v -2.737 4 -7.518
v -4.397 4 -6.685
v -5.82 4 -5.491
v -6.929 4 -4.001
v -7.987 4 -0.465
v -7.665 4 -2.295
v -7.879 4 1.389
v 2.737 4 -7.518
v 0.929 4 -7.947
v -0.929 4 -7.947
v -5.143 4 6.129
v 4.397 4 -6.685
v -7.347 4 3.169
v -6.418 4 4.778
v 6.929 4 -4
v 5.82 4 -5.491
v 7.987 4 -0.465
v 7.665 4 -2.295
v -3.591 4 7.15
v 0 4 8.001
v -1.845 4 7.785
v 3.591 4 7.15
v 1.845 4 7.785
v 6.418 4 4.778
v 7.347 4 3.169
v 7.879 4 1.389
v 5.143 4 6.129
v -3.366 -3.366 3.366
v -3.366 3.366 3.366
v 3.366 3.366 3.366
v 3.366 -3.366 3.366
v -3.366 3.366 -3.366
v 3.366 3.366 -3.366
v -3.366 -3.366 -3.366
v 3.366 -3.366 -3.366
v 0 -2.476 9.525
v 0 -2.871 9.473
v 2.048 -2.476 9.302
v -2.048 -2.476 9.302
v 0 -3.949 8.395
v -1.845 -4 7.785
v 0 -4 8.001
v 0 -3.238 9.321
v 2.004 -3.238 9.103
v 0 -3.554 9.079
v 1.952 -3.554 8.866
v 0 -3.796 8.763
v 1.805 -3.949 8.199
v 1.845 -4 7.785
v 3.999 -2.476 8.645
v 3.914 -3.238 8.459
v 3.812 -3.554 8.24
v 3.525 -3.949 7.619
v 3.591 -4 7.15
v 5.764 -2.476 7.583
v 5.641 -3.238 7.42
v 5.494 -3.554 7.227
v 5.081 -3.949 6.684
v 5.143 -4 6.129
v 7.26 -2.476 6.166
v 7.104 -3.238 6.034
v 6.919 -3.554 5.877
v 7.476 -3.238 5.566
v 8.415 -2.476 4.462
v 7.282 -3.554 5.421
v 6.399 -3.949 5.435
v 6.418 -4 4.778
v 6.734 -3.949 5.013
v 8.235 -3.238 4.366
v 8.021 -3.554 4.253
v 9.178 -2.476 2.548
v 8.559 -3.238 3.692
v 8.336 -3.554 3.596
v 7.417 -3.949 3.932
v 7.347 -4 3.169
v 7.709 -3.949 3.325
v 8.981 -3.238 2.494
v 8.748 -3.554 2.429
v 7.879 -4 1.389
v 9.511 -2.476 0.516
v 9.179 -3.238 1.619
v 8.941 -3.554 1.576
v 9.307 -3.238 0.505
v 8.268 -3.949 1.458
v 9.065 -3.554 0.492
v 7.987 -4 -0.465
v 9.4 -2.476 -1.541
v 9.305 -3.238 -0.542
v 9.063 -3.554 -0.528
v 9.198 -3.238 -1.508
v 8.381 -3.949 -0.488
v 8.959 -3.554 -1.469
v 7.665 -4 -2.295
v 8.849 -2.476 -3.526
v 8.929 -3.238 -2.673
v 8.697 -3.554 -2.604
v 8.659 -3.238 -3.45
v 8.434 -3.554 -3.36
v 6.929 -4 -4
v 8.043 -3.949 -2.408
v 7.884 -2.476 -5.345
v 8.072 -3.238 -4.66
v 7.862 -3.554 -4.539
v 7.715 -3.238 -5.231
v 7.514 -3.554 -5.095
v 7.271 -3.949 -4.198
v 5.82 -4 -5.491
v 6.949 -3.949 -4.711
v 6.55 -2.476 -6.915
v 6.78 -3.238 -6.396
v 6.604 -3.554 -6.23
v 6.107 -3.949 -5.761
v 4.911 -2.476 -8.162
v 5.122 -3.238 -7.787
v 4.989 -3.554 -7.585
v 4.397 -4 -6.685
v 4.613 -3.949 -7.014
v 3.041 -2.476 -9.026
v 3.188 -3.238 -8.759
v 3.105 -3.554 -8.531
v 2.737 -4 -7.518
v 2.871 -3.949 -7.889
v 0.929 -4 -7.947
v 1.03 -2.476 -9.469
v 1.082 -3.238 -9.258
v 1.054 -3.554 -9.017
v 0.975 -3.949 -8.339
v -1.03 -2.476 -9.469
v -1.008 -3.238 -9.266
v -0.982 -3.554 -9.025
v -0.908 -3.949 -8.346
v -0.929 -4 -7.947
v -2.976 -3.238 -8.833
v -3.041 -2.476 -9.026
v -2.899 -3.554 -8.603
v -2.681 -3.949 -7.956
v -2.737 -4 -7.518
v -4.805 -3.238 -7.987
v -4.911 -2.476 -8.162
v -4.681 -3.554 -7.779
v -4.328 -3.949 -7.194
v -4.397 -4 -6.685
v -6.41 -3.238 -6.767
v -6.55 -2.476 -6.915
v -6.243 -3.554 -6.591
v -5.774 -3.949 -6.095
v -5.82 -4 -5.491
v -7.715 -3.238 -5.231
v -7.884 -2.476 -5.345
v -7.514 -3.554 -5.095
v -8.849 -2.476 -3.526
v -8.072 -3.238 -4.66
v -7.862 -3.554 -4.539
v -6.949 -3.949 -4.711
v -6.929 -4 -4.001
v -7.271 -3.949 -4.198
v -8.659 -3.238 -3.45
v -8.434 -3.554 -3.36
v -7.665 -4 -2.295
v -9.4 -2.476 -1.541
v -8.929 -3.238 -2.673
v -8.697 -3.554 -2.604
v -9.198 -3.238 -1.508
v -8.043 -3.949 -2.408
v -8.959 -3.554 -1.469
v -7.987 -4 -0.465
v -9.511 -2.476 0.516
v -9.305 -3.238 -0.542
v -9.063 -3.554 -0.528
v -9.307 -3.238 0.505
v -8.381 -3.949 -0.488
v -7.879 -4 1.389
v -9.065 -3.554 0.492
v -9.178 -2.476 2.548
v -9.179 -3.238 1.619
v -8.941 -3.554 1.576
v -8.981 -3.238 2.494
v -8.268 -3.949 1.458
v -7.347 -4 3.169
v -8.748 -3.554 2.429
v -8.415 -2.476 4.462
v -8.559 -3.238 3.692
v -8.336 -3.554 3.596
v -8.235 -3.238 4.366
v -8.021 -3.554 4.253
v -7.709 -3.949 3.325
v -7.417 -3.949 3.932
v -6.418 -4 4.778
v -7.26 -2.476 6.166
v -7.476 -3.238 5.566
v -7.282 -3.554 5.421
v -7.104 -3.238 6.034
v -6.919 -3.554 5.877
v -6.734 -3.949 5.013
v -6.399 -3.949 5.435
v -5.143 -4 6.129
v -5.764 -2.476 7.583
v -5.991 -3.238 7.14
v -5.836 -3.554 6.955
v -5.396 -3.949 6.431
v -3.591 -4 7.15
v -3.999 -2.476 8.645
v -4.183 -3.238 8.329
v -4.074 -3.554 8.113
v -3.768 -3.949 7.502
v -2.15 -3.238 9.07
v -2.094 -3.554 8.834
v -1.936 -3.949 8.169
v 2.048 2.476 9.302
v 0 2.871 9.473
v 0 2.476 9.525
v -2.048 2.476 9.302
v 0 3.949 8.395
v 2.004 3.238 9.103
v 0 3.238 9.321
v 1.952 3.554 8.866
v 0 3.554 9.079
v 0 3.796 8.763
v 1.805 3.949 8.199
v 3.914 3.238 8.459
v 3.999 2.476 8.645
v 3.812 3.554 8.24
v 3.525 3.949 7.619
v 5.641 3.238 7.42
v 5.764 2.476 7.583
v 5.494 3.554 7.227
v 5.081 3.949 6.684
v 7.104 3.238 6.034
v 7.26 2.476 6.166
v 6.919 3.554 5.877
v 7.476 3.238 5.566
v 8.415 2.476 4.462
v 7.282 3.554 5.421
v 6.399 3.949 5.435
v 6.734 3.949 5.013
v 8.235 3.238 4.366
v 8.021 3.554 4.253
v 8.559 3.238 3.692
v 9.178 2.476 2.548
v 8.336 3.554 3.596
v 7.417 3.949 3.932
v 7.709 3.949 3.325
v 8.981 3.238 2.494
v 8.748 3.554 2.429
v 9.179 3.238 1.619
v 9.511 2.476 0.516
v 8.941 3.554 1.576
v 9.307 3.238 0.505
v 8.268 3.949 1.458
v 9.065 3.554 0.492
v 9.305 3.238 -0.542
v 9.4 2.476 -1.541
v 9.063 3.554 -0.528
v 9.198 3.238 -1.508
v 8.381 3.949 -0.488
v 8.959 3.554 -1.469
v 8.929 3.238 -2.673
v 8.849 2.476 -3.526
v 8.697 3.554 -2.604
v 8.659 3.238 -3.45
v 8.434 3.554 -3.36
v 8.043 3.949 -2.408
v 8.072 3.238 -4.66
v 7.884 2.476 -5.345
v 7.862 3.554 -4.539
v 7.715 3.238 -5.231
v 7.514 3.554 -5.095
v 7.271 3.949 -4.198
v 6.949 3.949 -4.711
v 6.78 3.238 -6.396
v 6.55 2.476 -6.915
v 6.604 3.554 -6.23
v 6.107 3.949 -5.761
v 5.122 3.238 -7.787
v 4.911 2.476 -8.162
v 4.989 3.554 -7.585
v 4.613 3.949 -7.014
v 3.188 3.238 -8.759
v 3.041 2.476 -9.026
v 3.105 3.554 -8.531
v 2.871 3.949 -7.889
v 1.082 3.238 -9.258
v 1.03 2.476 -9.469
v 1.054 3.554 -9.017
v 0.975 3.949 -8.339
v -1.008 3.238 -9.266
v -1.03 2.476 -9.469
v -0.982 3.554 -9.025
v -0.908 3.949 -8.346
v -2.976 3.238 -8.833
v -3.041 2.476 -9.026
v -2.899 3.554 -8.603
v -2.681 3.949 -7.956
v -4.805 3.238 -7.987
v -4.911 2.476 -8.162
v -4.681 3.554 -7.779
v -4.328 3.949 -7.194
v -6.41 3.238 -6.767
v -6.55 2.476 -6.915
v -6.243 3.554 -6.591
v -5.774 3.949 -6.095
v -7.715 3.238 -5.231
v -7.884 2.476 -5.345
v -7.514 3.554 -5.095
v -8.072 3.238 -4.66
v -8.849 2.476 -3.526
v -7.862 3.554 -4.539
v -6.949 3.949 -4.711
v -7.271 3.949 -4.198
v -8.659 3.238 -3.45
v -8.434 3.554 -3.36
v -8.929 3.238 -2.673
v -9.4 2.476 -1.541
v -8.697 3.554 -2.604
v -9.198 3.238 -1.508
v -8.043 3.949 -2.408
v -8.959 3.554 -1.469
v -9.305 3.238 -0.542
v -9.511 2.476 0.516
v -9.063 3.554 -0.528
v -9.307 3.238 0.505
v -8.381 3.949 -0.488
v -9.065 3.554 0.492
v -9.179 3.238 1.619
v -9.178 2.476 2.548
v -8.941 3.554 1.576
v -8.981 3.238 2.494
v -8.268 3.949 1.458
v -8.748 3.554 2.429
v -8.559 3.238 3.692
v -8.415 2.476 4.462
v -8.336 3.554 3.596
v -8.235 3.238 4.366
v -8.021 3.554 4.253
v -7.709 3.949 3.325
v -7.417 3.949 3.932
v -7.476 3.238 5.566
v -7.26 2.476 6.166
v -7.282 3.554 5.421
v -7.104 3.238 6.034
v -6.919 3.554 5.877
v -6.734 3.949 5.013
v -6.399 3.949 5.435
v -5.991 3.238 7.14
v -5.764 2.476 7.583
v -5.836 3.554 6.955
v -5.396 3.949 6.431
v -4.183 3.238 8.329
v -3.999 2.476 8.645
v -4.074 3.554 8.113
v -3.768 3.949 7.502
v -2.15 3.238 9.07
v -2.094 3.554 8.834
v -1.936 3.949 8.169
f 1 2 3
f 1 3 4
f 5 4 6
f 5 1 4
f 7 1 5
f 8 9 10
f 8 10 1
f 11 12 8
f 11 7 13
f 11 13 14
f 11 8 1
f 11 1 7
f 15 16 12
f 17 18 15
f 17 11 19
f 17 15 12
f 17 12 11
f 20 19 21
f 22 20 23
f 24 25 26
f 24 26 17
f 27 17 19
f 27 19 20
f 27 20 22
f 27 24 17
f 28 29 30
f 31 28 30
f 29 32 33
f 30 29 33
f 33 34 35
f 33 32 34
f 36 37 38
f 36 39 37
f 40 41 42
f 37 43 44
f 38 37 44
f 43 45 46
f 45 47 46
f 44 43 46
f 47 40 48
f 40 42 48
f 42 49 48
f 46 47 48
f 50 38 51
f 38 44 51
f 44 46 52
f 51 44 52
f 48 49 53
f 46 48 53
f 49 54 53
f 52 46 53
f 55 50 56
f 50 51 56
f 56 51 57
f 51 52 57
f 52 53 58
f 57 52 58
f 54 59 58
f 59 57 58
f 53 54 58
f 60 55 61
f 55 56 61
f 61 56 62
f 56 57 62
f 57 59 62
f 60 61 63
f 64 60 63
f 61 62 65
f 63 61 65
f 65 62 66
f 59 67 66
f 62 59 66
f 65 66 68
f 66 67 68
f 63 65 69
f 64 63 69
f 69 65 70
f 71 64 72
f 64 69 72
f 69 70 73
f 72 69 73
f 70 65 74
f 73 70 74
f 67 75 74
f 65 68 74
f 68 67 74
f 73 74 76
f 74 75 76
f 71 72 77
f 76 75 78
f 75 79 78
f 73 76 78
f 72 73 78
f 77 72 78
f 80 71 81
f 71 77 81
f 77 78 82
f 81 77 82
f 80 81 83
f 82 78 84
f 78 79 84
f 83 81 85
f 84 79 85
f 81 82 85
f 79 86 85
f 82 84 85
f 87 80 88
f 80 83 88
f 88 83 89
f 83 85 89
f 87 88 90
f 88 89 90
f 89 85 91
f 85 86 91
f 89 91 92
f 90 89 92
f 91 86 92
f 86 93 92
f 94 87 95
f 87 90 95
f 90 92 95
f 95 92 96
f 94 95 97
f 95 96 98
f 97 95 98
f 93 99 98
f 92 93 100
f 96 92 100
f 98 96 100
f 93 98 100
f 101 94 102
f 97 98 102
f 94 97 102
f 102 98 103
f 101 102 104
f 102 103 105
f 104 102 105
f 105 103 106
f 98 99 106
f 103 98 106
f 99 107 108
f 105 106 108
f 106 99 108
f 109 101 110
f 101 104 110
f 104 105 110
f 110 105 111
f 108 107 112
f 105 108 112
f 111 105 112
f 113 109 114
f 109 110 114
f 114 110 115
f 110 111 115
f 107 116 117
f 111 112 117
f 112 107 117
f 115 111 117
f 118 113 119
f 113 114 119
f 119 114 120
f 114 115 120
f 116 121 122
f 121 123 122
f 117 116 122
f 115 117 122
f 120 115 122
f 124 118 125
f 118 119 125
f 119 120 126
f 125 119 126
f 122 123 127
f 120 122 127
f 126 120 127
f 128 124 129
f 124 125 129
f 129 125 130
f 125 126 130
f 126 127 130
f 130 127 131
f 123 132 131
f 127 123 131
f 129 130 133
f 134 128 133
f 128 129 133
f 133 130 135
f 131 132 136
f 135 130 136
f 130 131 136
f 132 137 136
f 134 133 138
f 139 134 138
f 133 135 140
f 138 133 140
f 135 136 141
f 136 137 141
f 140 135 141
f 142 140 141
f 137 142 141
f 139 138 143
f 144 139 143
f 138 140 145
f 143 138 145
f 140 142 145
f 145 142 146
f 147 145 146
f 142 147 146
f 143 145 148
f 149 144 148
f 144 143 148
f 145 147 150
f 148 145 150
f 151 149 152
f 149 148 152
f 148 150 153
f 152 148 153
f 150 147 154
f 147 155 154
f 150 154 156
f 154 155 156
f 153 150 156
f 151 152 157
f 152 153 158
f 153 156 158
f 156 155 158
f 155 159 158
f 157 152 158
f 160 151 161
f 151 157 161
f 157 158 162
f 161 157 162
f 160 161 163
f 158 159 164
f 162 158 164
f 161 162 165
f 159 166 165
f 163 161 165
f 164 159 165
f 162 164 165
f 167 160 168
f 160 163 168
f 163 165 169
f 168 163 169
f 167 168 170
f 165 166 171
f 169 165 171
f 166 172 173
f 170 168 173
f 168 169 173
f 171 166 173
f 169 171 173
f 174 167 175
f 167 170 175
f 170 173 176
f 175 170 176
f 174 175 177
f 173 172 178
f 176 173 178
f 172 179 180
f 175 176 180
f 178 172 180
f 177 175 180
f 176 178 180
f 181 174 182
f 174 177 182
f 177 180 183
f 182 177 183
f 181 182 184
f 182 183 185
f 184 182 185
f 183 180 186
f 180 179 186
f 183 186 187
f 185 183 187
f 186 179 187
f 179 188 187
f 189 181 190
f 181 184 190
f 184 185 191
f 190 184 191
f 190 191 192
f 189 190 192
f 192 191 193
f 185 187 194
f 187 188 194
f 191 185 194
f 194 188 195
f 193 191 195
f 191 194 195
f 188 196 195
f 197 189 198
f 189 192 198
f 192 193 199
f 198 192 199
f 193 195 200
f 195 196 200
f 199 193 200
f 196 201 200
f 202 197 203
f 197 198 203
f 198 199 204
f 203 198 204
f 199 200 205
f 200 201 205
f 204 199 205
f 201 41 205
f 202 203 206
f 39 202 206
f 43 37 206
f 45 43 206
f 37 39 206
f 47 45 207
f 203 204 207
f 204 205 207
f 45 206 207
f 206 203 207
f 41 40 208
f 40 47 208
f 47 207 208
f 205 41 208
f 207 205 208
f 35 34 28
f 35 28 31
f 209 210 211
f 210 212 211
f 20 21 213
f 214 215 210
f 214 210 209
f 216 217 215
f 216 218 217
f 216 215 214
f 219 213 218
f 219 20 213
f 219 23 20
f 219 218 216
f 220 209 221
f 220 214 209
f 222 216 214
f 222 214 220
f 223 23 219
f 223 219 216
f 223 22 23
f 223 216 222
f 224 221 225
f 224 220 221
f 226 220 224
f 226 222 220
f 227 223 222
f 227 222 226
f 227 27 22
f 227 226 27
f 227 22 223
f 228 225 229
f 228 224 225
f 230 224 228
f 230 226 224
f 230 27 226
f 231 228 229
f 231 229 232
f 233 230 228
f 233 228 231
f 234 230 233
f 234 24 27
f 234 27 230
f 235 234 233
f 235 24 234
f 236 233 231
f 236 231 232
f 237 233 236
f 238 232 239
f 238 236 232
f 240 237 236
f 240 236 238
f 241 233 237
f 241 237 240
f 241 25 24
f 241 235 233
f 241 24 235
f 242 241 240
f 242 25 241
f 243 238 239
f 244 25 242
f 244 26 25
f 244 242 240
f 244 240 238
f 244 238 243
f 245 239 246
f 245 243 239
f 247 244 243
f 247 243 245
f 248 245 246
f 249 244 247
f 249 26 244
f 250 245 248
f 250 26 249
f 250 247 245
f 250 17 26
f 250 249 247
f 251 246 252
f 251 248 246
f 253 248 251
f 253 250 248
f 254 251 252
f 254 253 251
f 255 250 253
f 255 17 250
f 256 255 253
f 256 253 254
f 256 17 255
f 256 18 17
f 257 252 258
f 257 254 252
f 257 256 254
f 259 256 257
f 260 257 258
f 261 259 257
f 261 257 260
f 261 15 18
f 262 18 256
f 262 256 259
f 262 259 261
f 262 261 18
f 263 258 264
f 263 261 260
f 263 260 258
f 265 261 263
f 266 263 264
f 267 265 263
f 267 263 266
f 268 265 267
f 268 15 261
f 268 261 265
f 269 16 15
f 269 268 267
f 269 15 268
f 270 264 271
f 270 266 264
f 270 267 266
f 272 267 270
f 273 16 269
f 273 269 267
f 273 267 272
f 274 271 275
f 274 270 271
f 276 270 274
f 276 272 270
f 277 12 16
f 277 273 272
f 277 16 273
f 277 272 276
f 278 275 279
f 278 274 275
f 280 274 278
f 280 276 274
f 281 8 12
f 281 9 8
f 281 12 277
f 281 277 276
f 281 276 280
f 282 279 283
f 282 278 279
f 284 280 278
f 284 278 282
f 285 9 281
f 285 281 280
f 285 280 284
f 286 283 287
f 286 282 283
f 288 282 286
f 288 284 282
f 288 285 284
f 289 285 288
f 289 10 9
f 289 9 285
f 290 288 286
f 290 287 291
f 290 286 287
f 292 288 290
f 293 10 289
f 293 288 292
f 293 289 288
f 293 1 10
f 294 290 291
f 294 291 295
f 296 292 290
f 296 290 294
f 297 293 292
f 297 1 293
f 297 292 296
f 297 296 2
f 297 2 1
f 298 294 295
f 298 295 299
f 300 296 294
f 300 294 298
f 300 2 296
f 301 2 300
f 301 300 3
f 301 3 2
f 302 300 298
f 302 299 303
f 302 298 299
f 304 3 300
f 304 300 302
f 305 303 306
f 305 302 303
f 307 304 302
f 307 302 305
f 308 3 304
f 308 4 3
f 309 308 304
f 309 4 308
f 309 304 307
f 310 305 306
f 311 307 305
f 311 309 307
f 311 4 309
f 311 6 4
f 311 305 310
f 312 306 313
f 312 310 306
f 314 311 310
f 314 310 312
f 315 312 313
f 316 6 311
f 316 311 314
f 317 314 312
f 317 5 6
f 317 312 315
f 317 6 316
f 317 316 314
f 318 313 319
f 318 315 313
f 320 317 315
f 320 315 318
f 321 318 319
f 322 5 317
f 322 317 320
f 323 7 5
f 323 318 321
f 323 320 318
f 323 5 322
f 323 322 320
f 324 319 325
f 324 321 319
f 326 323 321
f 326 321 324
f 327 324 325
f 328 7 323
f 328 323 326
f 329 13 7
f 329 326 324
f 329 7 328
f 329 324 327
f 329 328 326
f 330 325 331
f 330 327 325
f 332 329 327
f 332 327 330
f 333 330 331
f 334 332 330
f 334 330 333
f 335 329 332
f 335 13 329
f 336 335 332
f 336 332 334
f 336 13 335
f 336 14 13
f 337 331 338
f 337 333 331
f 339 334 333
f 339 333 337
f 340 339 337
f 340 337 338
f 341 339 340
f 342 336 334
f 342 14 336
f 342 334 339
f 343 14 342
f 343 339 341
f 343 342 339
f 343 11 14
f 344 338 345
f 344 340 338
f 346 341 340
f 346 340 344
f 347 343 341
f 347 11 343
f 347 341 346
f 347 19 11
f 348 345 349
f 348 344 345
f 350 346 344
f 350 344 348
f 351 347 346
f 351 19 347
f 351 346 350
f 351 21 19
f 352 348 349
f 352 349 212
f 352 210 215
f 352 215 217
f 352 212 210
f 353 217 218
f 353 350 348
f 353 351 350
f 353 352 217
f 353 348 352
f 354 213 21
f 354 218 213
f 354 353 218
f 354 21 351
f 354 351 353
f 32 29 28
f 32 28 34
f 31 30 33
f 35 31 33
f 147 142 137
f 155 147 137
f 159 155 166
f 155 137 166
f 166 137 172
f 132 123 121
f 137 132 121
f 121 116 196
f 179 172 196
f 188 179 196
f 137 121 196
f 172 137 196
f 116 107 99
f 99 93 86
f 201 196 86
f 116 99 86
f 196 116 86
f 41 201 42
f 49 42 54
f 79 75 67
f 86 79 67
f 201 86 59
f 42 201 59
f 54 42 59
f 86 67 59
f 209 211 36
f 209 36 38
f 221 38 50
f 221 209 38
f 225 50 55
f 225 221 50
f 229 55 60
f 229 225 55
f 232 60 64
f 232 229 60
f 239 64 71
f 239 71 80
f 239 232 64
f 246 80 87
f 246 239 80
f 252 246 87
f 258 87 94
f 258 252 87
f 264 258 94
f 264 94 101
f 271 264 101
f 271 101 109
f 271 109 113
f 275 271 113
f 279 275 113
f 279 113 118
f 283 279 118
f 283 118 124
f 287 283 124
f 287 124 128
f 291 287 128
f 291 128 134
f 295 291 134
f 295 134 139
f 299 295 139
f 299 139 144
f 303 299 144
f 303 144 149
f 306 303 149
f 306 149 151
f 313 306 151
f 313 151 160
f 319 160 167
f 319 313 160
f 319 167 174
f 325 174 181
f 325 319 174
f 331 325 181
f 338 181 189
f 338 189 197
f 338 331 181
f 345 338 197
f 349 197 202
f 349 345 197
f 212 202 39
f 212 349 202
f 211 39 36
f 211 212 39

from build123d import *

# Parameters (mm, degrees)
SKETCH1_R           = 9.525
BOSS_EXTRUDE1_DEPTH = 4.0005
SKETCH1_3_W         = 6.731
SKETCH1_3_H         = 6.731
CUT_EXTRUDE1_DEPTH  = 3.3655
FILLET1_R           = 1.524


with BuildPart() as part:
    # Sketch1 → Boss-Extrude1 (new, symmetric)
    with BuildSketch(Plane(origin=(0, 0, 0), x_dir=(1, 0, 0), z_dir=(0, 1, 0))):
        Circle(SKETCH1_R)
    extrude(amount=BOSS_EXTRUDE1_DEPTH, both=True)

    # Sketch1<3> → Cut-Extrude1 (cut, symmetric)
    with BuildSketch(Plane(origin=(0, 0, 0), x_dir=(1, 0, 0), z_dir=(0, 1, 0))):
        Rectangle(SKETCH1_3_W, SKETCH1_3_H)
    extrude(amount=CUT_EXTRUDE1_DEPTH, both=True, mode=Mode.SUBTRACT)

    # Fillet1
    fillet1_edges = [part.edges().sort_by_distance(p)[0] for p in [
        (-9.525, 4.0005, 0),
        (-9.525, -4.0005, 0),
    ]]
    fillet(fillet1_edges, radius=FILLET1_R)


solid = part.part
